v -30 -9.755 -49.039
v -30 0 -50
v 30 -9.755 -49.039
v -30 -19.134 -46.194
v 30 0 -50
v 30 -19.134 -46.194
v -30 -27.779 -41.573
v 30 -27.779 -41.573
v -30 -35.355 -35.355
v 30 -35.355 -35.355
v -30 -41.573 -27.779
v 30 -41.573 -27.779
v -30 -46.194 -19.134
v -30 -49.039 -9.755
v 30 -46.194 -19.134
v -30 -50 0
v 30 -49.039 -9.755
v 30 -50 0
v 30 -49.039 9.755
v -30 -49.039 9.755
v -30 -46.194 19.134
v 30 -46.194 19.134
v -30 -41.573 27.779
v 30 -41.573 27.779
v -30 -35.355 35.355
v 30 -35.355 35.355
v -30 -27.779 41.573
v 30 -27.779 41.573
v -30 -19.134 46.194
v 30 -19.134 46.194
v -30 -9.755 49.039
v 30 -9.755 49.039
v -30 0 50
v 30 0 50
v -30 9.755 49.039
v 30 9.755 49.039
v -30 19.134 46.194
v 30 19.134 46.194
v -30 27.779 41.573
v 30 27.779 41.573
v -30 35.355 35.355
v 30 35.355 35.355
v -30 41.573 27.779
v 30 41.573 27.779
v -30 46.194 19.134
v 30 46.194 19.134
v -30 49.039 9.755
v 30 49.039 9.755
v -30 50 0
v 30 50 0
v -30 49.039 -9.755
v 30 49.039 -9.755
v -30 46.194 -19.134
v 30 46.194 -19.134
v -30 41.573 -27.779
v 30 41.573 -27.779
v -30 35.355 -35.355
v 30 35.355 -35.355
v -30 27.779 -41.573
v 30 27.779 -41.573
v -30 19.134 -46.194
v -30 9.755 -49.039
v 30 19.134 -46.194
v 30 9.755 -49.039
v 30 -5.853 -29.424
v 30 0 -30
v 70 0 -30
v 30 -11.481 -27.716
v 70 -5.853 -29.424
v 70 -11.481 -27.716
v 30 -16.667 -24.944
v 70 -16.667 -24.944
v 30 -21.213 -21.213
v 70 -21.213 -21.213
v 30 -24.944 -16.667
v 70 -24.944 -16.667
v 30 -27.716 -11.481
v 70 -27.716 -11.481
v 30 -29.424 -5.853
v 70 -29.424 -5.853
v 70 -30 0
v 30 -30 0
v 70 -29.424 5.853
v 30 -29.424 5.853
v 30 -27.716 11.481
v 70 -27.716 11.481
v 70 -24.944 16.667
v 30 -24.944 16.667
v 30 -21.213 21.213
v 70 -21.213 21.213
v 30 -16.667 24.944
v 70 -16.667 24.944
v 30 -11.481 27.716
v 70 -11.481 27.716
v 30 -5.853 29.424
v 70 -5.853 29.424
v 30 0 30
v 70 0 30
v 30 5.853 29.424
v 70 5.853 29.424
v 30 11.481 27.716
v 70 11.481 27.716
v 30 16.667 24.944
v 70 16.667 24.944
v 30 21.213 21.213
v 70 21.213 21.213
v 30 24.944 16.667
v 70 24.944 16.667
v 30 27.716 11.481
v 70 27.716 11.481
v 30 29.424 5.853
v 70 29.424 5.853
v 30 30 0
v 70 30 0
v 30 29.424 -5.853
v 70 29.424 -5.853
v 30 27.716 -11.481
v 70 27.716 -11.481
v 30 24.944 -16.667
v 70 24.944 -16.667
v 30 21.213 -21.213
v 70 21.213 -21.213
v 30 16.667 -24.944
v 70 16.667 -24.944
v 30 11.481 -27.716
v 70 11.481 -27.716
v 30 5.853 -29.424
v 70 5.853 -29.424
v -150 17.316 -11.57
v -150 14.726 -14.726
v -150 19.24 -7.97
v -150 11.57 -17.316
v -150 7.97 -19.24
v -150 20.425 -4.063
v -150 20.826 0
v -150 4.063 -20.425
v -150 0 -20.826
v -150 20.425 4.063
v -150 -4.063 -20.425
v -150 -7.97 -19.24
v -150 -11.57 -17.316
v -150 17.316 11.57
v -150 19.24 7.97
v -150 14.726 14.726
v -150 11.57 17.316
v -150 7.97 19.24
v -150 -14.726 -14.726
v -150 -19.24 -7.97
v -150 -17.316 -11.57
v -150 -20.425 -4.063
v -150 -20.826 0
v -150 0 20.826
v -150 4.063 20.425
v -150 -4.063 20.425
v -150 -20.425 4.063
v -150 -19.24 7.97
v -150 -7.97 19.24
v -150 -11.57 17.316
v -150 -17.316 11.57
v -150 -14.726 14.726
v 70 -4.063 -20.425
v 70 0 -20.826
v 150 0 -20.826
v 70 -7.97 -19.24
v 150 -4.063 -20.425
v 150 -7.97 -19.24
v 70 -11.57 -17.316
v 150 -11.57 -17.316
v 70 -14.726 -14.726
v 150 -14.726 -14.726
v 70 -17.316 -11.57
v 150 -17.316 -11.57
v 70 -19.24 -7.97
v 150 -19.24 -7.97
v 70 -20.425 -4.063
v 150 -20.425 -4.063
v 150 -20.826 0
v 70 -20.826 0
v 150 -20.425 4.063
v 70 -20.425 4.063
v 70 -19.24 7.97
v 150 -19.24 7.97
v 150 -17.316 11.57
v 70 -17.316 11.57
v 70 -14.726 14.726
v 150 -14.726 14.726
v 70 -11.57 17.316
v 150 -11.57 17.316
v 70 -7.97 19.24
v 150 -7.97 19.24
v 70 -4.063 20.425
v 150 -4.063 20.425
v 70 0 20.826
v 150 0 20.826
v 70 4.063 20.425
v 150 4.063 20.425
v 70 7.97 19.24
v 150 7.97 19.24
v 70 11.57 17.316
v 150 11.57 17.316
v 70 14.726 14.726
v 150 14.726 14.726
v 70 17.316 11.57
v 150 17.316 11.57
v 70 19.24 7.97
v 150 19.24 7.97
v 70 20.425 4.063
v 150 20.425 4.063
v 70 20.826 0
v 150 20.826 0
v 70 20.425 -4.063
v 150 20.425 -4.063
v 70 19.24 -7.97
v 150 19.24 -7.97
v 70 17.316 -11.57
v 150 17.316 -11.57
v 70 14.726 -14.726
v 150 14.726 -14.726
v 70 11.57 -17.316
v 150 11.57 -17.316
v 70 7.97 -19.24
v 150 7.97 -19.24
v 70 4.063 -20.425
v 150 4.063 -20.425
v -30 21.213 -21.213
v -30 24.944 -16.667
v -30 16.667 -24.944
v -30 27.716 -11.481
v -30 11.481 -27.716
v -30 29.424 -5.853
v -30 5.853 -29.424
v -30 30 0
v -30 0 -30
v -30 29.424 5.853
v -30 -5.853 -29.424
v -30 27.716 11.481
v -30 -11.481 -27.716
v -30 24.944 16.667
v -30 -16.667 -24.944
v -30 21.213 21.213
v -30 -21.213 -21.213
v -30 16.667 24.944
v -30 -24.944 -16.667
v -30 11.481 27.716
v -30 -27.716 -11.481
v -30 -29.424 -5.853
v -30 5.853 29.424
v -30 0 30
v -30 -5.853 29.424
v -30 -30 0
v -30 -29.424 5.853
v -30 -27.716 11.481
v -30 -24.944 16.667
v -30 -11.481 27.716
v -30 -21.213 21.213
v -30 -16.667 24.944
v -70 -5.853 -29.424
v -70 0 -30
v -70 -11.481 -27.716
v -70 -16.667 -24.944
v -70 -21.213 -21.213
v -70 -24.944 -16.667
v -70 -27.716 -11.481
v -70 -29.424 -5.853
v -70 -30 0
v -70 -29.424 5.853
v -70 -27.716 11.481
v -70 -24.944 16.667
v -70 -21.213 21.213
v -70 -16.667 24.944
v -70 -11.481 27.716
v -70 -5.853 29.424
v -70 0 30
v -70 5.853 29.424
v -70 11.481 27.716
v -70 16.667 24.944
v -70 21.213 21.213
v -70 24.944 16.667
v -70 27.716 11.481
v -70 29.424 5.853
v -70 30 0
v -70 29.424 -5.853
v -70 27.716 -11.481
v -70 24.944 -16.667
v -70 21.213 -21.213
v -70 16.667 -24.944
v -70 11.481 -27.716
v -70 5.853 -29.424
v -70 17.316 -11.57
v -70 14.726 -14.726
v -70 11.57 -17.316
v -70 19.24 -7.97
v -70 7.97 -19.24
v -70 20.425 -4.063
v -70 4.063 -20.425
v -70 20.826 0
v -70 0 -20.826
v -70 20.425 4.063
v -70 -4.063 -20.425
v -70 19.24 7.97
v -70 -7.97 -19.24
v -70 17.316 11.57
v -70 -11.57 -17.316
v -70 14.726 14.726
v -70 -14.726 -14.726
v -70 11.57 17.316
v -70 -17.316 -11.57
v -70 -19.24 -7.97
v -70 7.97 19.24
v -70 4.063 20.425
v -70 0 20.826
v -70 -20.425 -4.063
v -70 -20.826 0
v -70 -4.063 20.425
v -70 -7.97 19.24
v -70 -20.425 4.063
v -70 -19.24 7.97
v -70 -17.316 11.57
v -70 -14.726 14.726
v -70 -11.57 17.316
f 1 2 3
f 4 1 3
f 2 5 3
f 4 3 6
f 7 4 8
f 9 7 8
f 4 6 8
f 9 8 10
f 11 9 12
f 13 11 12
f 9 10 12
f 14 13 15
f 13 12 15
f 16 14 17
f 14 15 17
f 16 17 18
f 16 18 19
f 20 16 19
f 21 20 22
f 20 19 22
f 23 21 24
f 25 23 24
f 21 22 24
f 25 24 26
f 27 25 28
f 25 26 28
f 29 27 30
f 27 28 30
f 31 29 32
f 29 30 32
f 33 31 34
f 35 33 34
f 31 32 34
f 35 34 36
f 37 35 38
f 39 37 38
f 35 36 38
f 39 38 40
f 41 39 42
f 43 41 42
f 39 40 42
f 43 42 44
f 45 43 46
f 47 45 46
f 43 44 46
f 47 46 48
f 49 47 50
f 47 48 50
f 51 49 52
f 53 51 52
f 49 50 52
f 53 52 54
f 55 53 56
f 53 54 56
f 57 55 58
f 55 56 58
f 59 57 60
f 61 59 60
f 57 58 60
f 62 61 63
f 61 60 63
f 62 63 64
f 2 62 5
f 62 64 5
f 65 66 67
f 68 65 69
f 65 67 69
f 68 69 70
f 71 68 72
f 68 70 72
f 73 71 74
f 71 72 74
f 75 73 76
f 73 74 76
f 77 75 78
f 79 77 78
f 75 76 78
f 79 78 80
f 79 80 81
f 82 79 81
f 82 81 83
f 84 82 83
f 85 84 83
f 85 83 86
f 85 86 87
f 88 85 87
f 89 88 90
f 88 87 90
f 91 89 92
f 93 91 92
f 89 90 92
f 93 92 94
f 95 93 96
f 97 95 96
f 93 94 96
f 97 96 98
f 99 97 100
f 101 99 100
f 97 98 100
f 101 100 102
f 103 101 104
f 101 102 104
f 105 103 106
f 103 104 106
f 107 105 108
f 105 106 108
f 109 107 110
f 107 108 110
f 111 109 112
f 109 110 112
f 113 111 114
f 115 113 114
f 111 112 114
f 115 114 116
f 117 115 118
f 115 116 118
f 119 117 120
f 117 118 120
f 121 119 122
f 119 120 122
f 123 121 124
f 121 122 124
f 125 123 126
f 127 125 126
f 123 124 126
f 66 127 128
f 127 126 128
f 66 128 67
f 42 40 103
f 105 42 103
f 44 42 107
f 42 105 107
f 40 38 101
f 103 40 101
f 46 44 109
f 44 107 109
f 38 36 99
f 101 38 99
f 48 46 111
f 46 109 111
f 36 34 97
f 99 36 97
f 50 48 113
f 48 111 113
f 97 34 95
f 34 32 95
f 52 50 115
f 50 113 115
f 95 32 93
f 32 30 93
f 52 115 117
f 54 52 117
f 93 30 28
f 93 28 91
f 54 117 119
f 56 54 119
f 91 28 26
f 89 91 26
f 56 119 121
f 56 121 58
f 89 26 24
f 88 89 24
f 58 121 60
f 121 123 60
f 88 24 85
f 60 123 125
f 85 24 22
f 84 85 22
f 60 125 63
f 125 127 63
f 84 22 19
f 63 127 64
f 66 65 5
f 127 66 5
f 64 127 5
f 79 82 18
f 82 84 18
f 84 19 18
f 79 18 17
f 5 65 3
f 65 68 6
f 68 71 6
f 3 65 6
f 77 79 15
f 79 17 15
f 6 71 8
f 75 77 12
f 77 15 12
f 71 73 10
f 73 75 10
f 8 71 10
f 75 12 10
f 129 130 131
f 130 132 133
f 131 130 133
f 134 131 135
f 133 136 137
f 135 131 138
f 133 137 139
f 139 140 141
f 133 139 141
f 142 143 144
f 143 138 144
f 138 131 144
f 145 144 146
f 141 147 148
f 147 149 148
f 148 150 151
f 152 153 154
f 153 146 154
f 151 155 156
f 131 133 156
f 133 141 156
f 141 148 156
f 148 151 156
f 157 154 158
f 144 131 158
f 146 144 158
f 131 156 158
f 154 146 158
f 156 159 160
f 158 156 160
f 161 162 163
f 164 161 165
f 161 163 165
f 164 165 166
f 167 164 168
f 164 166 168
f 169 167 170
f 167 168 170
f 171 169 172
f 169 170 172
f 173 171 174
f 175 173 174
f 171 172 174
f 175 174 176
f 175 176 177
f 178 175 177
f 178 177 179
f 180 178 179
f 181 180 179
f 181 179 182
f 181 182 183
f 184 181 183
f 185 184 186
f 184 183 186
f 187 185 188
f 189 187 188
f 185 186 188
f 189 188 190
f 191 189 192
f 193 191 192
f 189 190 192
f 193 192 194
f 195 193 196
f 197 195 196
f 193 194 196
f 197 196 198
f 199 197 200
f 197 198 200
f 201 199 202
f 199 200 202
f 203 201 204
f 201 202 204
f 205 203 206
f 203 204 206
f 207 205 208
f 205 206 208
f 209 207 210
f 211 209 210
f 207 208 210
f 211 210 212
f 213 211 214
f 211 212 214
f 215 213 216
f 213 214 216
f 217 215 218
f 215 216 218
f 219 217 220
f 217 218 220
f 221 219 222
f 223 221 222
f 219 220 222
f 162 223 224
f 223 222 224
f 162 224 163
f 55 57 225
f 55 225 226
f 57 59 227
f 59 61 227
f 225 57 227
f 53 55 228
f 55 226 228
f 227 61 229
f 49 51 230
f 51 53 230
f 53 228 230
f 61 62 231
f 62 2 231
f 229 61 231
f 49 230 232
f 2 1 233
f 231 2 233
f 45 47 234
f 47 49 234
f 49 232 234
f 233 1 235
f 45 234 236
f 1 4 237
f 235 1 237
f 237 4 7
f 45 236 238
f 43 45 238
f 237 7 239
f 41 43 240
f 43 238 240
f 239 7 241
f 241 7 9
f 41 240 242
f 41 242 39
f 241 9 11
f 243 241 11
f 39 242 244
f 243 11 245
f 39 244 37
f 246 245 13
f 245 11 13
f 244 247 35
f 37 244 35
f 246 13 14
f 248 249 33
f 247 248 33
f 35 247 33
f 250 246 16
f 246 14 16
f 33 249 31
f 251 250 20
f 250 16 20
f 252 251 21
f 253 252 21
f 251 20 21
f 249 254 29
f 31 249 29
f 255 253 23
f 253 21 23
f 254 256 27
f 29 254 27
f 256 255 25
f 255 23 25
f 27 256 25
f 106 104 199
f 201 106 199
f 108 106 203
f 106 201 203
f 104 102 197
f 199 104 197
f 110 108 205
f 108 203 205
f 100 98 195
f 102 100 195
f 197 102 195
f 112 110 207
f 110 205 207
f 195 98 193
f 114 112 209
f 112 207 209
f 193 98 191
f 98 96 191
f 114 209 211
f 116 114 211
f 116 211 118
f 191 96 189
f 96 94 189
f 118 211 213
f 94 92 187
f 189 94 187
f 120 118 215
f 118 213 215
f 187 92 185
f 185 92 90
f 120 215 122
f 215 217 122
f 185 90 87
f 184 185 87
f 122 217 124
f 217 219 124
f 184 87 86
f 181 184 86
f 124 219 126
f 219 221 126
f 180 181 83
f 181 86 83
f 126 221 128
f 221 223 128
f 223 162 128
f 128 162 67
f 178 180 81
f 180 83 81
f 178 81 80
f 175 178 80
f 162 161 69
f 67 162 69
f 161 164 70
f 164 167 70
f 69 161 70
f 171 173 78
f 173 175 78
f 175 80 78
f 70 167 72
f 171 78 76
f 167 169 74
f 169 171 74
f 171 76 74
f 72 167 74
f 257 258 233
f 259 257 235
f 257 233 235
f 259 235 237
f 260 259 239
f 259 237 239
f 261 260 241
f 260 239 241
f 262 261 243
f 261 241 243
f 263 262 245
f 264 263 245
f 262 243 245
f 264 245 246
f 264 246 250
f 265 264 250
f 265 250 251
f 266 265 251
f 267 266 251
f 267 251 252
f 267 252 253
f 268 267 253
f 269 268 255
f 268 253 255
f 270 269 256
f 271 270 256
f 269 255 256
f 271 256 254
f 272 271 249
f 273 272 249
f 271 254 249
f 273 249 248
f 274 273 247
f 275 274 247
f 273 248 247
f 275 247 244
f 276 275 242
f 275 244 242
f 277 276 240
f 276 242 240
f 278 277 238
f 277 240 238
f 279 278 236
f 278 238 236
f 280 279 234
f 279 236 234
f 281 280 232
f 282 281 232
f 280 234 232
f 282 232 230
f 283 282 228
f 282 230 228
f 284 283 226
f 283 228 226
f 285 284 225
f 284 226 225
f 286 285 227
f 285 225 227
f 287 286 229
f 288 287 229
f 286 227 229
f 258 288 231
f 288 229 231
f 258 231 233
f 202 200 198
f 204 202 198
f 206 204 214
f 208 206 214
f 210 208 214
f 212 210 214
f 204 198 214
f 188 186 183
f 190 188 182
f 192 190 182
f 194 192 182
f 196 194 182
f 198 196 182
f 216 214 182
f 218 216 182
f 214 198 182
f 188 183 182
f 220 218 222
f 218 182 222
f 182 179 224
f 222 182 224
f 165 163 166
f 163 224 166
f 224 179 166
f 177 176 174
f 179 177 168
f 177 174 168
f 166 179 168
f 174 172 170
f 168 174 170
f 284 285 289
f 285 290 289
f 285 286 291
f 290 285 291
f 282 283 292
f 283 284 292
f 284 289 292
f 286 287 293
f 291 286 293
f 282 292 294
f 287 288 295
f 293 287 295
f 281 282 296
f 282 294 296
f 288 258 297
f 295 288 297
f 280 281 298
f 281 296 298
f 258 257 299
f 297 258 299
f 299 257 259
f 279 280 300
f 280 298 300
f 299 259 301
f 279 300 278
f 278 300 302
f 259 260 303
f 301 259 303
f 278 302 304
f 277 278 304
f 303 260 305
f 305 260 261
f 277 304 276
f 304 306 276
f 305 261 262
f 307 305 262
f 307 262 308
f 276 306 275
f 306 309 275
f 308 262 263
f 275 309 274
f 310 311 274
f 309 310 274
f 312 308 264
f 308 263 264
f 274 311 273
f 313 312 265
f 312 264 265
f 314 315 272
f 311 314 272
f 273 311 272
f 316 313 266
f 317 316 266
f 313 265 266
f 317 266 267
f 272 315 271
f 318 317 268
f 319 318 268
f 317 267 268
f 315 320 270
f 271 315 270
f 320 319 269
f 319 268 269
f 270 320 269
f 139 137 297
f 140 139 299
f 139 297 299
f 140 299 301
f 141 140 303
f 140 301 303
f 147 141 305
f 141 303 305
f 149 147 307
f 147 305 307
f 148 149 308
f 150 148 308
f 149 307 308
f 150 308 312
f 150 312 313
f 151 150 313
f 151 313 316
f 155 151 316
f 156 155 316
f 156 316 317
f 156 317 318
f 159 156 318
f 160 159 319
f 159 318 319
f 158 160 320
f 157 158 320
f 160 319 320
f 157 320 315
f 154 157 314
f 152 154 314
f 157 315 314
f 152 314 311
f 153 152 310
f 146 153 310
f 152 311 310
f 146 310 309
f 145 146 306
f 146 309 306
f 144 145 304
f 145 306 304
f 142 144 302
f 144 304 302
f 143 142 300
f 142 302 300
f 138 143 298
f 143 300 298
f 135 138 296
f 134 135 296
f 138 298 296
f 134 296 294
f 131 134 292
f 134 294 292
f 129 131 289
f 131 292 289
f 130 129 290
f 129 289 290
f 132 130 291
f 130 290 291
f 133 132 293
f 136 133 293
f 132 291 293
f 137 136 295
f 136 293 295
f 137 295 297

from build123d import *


with BuildPart() as part:
    # Sketch1 → Revolve6 (revolve)
    with BuildSketch(Plane.XY, mode=Mode.PRIVATE) as revolve6_sk:
        Polygon((-30, -50), (30, -50), (30, -30), (70, -30), (70, -20.825600731), (150, -20.825600731), (150, 0), (-150, 0), (-150, -20.825600731), (-70, -20.825600731), (-70, -30), (-30, -30), align=None)
    revolve(revolve6_sk.sketch.rotate(Axis((0, 0, 0), (-1, 0, 0)), 270), axis=Axis((0, 0, 0), (-1, 0, 0)))  # turned: the seam where the file's is


solid = part.part
